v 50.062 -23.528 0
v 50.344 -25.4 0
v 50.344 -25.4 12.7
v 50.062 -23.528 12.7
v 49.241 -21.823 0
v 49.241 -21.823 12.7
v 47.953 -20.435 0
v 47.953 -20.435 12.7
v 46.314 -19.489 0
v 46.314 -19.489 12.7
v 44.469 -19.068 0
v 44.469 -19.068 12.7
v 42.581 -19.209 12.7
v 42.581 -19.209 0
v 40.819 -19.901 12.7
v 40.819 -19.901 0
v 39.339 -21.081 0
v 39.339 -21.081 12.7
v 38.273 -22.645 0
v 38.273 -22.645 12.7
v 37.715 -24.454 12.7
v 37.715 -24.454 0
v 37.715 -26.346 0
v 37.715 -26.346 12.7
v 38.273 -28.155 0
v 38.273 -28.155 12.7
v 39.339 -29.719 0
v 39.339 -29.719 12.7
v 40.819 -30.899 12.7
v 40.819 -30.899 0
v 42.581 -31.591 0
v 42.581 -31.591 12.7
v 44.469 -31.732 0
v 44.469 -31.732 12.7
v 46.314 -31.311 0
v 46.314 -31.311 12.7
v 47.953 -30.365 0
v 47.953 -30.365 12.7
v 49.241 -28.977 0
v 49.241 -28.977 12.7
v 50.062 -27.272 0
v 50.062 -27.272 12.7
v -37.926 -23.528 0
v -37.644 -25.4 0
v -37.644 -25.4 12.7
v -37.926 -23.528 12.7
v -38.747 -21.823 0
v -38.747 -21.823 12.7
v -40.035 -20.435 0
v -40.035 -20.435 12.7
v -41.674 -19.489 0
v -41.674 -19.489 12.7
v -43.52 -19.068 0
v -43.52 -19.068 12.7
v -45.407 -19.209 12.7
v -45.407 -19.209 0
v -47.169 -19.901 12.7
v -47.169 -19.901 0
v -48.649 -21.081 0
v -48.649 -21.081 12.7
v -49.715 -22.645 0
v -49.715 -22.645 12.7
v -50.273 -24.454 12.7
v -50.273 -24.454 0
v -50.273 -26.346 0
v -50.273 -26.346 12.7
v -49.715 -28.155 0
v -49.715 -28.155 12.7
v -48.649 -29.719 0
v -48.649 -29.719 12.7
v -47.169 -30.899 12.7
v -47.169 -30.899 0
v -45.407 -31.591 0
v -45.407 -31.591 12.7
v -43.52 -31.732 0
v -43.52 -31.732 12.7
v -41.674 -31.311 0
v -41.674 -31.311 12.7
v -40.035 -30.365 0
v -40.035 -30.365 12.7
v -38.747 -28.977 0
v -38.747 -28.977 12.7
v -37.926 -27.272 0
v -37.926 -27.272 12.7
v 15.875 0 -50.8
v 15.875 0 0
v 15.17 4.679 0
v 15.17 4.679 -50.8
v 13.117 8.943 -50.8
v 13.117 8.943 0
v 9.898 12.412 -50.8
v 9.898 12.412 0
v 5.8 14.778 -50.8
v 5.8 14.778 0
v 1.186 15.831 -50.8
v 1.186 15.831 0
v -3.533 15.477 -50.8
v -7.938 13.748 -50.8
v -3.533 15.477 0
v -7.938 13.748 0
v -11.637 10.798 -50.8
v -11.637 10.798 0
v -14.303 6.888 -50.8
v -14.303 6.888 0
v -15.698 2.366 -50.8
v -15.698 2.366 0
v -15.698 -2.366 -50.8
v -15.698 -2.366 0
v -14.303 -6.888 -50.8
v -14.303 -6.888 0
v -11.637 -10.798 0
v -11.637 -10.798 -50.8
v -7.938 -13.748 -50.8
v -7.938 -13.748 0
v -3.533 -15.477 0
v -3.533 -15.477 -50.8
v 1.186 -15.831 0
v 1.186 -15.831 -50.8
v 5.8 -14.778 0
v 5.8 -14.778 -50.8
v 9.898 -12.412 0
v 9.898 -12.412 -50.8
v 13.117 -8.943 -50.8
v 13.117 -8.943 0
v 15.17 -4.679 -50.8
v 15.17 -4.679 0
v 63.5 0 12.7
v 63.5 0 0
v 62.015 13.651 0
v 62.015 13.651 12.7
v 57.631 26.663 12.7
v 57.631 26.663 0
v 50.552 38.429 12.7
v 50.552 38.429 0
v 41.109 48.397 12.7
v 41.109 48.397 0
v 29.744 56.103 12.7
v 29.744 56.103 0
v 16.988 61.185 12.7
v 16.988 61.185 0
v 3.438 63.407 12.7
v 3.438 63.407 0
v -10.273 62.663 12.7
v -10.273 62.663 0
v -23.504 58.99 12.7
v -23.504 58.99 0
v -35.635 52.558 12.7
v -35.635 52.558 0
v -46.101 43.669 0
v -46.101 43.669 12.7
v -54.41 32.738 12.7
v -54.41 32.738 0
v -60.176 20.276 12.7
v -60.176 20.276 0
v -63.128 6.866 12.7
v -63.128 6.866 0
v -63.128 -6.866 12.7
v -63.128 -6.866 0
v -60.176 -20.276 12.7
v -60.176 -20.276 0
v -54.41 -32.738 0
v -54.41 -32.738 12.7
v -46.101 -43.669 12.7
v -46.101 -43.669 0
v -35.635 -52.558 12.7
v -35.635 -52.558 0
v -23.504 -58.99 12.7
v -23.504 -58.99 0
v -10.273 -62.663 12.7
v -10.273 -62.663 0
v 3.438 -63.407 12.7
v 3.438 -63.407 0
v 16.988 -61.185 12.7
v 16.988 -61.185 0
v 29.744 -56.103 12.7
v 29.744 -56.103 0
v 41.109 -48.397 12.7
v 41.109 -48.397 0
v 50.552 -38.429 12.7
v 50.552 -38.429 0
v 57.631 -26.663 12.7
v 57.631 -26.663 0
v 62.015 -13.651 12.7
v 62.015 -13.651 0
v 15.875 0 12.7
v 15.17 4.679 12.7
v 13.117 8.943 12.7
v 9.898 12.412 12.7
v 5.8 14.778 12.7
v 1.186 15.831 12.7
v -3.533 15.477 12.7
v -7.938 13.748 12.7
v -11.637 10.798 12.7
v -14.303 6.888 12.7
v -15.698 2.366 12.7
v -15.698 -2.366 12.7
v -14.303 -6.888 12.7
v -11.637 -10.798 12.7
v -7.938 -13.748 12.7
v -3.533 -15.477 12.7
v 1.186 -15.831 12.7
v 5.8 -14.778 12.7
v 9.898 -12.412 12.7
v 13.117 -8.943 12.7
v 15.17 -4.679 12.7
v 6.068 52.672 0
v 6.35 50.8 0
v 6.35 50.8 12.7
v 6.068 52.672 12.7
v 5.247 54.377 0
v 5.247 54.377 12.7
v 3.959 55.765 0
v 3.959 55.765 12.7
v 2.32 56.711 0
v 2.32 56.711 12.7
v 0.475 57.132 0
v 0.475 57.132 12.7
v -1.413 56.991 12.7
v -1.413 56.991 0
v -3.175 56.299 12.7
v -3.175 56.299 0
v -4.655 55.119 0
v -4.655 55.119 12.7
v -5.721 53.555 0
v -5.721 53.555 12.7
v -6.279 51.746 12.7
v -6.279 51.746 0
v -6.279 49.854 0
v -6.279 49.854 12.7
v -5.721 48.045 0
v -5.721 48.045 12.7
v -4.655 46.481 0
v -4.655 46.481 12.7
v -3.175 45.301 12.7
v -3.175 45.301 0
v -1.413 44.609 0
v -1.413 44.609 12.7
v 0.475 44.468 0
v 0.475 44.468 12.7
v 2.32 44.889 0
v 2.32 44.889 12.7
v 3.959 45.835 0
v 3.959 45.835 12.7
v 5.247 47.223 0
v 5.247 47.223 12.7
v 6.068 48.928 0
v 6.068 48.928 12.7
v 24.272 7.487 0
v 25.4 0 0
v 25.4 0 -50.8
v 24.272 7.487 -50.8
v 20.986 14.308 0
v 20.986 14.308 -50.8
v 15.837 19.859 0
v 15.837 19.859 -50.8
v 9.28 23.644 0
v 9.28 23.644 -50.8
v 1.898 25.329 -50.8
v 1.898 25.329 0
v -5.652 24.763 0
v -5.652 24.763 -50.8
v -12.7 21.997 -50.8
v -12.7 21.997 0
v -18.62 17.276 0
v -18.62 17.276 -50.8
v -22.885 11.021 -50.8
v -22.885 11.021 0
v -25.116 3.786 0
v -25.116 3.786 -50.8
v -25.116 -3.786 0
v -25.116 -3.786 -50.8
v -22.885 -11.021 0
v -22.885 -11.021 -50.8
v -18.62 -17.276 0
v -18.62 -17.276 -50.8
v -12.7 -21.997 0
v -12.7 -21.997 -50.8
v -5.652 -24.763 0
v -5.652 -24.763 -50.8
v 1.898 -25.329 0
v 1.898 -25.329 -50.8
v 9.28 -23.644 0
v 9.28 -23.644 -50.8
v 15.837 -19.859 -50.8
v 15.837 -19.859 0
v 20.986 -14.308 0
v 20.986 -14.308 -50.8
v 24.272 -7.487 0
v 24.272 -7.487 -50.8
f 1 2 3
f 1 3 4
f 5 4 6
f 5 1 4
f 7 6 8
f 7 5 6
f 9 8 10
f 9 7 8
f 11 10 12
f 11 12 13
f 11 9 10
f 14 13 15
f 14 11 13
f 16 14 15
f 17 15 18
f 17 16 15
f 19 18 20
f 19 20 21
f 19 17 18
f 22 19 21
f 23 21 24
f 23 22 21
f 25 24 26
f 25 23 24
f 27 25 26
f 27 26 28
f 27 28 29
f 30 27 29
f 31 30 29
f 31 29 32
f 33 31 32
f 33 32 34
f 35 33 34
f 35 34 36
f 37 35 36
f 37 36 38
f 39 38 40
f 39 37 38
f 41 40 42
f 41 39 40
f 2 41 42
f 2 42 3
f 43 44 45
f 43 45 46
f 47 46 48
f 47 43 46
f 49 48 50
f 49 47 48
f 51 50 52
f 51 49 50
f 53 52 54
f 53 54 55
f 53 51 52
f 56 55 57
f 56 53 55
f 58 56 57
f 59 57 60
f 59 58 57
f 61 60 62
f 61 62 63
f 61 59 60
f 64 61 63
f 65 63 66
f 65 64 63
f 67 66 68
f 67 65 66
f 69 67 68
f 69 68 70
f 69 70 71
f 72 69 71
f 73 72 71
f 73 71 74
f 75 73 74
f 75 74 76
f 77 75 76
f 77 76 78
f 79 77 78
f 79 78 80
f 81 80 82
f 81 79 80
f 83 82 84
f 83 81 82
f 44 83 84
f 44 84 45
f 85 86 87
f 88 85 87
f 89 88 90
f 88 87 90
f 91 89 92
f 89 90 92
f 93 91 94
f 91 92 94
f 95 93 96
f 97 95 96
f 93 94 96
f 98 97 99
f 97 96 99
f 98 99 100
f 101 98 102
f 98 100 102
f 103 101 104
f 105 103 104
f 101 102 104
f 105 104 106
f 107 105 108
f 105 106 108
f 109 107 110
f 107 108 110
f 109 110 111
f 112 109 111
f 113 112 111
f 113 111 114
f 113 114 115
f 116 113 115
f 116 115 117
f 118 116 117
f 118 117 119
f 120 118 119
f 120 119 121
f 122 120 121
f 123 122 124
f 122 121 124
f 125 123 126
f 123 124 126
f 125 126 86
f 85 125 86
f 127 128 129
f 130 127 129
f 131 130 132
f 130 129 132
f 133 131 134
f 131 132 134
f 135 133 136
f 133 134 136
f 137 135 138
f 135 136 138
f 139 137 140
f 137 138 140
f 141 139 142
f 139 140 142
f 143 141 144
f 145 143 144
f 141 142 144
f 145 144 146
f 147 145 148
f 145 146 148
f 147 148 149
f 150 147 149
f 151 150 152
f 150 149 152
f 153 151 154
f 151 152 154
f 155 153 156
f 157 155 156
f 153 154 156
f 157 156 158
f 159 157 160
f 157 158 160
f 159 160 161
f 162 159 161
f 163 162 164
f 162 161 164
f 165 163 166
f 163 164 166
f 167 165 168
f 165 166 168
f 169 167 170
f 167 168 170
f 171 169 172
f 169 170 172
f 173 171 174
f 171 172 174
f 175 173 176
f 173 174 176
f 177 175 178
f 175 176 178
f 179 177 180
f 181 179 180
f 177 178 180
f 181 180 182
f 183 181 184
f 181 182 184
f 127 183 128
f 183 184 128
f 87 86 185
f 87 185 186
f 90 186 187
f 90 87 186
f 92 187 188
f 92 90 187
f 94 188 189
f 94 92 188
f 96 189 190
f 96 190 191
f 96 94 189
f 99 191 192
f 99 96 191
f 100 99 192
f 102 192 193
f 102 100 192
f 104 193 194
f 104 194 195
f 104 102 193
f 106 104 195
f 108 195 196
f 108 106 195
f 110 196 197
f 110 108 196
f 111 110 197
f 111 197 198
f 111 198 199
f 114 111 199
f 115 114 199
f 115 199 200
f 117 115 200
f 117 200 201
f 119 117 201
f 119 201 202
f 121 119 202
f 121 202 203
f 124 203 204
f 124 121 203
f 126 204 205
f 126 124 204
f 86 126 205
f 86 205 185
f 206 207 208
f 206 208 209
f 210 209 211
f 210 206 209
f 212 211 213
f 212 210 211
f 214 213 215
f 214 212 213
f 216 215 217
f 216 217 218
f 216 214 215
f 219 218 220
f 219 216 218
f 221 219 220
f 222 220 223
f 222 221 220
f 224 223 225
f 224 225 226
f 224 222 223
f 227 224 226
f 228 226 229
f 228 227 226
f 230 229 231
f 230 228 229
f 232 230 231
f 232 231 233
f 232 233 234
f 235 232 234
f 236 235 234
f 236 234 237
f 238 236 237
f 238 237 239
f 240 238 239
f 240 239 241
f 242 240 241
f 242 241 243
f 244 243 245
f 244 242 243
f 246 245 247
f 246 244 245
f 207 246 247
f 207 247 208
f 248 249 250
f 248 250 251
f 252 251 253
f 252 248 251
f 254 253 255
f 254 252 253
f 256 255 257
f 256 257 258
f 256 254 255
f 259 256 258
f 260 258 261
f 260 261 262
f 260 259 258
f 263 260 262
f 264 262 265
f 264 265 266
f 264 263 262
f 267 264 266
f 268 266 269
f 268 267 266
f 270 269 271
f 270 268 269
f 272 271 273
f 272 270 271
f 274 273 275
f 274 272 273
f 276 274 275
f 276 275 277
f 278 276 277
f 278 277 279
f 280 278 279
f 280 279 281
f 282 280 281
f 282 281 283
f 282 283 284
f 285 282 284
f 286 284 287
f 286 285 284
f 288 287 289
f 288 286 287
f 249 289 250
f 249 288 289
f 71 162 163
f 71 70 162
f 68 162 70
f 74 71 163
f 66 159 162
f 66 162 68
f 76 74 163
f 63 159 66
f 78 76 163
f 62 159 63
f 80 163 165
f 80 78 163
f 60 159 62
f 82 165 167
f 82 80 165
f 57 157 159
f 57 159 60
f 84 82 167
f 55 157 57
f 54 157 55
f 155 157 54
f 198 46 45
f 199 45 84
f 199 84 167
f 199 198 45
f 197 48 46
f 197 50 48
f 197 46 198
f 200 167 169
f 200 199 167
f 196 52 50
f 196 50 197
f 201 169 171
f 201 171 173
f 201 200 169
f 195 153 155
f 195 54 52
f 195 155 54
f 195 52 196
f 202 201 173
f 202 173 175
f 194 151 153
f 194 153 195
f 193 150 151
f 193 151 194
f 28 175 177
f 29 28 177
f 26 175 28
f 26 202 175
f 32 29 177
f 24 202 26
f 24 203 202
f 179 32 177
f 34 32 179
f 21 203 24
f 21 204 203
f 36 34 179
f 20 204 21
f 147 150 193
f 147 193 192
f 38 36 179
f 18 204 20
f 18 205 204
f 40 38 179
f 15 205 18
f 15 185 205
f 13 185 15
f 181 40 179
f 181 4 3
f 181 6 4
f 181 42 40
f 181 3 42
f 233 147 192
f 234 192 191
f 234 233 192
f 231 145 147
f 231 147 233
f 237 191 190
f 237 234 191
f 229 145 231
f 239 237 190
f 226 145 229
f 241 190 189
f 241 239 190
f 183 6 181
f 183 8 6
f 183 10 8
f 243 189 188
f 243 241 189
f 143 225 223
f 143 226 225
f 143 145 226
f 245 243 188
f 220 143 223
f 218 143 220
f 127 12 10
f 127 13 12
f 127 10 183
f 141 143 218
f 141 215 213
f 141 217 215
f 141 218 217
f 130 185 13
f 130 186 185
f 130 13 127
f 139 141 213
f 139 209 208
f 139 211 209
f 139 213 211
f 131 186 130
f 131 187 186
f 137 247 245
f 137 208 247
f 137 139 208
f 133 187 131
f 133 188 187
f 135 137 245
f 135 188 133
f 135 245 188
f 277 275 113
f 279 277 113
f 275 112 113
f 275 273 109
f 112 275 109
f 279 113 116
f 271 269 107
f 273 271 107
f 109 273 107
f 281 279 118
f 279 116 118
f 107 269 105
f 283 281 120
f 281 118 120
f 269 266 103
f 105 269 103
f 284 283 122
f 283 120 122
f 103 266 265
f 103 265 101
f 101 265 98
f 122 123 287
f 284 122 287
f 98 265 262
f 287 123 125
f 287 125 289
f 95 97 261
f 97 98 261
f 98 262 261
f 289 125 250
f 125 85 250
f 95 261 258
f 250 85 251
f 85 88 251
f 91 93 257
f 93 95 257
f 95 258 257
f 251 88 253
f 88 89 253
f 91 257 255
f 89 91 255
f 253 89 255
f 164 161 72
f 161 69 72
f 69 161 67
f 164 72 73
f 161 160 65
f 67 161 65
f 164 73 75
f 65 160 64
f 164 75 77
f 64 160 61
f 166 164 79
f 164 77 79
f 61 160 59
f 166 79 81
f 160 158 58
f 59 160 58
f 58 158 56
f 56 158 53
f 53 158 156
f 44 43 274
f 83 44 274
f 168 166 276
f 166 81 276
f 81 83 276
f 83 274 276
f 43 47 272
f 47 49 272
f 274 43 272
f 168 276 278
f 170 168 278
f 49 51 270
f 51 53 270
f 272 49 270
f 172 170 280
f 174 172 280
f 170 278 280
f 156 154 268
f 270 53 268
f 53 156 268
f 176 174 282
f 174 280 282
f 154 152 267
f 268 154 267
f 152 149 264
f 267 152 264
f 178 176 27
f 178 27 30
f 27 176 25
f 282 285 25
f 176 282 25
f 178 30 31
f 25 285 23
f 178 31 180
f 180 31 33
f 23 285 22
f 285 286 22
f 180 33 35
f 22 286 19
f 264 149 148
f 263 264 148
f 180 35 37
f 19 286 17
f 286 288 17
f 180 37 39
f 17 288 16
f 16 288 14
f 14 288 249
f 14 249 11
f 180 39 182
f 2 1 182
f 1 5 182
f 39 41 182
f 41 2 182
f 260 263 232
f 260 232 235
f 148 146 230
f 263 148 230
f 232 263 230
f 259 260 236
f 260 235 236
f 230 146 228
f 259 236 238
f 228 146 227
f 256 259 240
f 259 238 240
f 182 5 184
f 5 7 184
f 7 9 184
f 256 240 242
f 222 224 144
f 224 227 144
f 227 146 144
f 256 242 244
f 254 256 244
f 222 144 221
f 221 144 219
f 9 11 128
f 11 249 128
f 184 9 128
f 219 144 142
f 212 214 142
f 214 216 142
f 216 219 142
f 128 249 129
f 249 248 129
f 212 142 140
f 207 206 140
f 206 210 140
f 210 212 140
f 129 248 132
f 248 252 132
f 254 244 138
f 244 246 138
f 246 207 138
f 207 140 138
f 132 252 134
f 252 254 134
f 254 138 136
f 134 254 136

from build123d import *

# Parameters (mm, degrees)
F0_R     = 63.5
F0_R_2   = 6.35
F0_R_3   = 25.4
F0_R_4   = 15.875
F1_DEPTH = 12.7
F2_DEPTH = 50.8


with BuildPart() as f1:
    # F0 (on Top) → F1 (new body)
    with BuildSketch(Plane.XY):
        Circle(F0_R)
        with Locations((-43.994091, -25.4)):
            Circle(F0_R_2, mode=Mode.SUBTRACT)
        with Locations((43.994091, -25.4)):
            Circle(F0_R_2, mode=Mode.SUBTRACT)
        Circle(F0_R_3, mode=Mode.SUBTRACT)
        with Locations((0, 50.8)):
            Circle(F0_R_2, mode=Mode.SUBTRACT)
        Circle(F0_R_3)
        Circle(F0_R_4, mode=Mode.SUBTRACT)
    extrude(amount=F1_DEPTH)

    # F0 (on Top) → F2 (join)
    with BuildSketch(Plane.XY):
        Circle(F0_R_3)
        Circle(F0_R_4, mode=Mode.SUBTRACT)
    extrude(amount=-F2_DEPTH)


solid = f1.part
